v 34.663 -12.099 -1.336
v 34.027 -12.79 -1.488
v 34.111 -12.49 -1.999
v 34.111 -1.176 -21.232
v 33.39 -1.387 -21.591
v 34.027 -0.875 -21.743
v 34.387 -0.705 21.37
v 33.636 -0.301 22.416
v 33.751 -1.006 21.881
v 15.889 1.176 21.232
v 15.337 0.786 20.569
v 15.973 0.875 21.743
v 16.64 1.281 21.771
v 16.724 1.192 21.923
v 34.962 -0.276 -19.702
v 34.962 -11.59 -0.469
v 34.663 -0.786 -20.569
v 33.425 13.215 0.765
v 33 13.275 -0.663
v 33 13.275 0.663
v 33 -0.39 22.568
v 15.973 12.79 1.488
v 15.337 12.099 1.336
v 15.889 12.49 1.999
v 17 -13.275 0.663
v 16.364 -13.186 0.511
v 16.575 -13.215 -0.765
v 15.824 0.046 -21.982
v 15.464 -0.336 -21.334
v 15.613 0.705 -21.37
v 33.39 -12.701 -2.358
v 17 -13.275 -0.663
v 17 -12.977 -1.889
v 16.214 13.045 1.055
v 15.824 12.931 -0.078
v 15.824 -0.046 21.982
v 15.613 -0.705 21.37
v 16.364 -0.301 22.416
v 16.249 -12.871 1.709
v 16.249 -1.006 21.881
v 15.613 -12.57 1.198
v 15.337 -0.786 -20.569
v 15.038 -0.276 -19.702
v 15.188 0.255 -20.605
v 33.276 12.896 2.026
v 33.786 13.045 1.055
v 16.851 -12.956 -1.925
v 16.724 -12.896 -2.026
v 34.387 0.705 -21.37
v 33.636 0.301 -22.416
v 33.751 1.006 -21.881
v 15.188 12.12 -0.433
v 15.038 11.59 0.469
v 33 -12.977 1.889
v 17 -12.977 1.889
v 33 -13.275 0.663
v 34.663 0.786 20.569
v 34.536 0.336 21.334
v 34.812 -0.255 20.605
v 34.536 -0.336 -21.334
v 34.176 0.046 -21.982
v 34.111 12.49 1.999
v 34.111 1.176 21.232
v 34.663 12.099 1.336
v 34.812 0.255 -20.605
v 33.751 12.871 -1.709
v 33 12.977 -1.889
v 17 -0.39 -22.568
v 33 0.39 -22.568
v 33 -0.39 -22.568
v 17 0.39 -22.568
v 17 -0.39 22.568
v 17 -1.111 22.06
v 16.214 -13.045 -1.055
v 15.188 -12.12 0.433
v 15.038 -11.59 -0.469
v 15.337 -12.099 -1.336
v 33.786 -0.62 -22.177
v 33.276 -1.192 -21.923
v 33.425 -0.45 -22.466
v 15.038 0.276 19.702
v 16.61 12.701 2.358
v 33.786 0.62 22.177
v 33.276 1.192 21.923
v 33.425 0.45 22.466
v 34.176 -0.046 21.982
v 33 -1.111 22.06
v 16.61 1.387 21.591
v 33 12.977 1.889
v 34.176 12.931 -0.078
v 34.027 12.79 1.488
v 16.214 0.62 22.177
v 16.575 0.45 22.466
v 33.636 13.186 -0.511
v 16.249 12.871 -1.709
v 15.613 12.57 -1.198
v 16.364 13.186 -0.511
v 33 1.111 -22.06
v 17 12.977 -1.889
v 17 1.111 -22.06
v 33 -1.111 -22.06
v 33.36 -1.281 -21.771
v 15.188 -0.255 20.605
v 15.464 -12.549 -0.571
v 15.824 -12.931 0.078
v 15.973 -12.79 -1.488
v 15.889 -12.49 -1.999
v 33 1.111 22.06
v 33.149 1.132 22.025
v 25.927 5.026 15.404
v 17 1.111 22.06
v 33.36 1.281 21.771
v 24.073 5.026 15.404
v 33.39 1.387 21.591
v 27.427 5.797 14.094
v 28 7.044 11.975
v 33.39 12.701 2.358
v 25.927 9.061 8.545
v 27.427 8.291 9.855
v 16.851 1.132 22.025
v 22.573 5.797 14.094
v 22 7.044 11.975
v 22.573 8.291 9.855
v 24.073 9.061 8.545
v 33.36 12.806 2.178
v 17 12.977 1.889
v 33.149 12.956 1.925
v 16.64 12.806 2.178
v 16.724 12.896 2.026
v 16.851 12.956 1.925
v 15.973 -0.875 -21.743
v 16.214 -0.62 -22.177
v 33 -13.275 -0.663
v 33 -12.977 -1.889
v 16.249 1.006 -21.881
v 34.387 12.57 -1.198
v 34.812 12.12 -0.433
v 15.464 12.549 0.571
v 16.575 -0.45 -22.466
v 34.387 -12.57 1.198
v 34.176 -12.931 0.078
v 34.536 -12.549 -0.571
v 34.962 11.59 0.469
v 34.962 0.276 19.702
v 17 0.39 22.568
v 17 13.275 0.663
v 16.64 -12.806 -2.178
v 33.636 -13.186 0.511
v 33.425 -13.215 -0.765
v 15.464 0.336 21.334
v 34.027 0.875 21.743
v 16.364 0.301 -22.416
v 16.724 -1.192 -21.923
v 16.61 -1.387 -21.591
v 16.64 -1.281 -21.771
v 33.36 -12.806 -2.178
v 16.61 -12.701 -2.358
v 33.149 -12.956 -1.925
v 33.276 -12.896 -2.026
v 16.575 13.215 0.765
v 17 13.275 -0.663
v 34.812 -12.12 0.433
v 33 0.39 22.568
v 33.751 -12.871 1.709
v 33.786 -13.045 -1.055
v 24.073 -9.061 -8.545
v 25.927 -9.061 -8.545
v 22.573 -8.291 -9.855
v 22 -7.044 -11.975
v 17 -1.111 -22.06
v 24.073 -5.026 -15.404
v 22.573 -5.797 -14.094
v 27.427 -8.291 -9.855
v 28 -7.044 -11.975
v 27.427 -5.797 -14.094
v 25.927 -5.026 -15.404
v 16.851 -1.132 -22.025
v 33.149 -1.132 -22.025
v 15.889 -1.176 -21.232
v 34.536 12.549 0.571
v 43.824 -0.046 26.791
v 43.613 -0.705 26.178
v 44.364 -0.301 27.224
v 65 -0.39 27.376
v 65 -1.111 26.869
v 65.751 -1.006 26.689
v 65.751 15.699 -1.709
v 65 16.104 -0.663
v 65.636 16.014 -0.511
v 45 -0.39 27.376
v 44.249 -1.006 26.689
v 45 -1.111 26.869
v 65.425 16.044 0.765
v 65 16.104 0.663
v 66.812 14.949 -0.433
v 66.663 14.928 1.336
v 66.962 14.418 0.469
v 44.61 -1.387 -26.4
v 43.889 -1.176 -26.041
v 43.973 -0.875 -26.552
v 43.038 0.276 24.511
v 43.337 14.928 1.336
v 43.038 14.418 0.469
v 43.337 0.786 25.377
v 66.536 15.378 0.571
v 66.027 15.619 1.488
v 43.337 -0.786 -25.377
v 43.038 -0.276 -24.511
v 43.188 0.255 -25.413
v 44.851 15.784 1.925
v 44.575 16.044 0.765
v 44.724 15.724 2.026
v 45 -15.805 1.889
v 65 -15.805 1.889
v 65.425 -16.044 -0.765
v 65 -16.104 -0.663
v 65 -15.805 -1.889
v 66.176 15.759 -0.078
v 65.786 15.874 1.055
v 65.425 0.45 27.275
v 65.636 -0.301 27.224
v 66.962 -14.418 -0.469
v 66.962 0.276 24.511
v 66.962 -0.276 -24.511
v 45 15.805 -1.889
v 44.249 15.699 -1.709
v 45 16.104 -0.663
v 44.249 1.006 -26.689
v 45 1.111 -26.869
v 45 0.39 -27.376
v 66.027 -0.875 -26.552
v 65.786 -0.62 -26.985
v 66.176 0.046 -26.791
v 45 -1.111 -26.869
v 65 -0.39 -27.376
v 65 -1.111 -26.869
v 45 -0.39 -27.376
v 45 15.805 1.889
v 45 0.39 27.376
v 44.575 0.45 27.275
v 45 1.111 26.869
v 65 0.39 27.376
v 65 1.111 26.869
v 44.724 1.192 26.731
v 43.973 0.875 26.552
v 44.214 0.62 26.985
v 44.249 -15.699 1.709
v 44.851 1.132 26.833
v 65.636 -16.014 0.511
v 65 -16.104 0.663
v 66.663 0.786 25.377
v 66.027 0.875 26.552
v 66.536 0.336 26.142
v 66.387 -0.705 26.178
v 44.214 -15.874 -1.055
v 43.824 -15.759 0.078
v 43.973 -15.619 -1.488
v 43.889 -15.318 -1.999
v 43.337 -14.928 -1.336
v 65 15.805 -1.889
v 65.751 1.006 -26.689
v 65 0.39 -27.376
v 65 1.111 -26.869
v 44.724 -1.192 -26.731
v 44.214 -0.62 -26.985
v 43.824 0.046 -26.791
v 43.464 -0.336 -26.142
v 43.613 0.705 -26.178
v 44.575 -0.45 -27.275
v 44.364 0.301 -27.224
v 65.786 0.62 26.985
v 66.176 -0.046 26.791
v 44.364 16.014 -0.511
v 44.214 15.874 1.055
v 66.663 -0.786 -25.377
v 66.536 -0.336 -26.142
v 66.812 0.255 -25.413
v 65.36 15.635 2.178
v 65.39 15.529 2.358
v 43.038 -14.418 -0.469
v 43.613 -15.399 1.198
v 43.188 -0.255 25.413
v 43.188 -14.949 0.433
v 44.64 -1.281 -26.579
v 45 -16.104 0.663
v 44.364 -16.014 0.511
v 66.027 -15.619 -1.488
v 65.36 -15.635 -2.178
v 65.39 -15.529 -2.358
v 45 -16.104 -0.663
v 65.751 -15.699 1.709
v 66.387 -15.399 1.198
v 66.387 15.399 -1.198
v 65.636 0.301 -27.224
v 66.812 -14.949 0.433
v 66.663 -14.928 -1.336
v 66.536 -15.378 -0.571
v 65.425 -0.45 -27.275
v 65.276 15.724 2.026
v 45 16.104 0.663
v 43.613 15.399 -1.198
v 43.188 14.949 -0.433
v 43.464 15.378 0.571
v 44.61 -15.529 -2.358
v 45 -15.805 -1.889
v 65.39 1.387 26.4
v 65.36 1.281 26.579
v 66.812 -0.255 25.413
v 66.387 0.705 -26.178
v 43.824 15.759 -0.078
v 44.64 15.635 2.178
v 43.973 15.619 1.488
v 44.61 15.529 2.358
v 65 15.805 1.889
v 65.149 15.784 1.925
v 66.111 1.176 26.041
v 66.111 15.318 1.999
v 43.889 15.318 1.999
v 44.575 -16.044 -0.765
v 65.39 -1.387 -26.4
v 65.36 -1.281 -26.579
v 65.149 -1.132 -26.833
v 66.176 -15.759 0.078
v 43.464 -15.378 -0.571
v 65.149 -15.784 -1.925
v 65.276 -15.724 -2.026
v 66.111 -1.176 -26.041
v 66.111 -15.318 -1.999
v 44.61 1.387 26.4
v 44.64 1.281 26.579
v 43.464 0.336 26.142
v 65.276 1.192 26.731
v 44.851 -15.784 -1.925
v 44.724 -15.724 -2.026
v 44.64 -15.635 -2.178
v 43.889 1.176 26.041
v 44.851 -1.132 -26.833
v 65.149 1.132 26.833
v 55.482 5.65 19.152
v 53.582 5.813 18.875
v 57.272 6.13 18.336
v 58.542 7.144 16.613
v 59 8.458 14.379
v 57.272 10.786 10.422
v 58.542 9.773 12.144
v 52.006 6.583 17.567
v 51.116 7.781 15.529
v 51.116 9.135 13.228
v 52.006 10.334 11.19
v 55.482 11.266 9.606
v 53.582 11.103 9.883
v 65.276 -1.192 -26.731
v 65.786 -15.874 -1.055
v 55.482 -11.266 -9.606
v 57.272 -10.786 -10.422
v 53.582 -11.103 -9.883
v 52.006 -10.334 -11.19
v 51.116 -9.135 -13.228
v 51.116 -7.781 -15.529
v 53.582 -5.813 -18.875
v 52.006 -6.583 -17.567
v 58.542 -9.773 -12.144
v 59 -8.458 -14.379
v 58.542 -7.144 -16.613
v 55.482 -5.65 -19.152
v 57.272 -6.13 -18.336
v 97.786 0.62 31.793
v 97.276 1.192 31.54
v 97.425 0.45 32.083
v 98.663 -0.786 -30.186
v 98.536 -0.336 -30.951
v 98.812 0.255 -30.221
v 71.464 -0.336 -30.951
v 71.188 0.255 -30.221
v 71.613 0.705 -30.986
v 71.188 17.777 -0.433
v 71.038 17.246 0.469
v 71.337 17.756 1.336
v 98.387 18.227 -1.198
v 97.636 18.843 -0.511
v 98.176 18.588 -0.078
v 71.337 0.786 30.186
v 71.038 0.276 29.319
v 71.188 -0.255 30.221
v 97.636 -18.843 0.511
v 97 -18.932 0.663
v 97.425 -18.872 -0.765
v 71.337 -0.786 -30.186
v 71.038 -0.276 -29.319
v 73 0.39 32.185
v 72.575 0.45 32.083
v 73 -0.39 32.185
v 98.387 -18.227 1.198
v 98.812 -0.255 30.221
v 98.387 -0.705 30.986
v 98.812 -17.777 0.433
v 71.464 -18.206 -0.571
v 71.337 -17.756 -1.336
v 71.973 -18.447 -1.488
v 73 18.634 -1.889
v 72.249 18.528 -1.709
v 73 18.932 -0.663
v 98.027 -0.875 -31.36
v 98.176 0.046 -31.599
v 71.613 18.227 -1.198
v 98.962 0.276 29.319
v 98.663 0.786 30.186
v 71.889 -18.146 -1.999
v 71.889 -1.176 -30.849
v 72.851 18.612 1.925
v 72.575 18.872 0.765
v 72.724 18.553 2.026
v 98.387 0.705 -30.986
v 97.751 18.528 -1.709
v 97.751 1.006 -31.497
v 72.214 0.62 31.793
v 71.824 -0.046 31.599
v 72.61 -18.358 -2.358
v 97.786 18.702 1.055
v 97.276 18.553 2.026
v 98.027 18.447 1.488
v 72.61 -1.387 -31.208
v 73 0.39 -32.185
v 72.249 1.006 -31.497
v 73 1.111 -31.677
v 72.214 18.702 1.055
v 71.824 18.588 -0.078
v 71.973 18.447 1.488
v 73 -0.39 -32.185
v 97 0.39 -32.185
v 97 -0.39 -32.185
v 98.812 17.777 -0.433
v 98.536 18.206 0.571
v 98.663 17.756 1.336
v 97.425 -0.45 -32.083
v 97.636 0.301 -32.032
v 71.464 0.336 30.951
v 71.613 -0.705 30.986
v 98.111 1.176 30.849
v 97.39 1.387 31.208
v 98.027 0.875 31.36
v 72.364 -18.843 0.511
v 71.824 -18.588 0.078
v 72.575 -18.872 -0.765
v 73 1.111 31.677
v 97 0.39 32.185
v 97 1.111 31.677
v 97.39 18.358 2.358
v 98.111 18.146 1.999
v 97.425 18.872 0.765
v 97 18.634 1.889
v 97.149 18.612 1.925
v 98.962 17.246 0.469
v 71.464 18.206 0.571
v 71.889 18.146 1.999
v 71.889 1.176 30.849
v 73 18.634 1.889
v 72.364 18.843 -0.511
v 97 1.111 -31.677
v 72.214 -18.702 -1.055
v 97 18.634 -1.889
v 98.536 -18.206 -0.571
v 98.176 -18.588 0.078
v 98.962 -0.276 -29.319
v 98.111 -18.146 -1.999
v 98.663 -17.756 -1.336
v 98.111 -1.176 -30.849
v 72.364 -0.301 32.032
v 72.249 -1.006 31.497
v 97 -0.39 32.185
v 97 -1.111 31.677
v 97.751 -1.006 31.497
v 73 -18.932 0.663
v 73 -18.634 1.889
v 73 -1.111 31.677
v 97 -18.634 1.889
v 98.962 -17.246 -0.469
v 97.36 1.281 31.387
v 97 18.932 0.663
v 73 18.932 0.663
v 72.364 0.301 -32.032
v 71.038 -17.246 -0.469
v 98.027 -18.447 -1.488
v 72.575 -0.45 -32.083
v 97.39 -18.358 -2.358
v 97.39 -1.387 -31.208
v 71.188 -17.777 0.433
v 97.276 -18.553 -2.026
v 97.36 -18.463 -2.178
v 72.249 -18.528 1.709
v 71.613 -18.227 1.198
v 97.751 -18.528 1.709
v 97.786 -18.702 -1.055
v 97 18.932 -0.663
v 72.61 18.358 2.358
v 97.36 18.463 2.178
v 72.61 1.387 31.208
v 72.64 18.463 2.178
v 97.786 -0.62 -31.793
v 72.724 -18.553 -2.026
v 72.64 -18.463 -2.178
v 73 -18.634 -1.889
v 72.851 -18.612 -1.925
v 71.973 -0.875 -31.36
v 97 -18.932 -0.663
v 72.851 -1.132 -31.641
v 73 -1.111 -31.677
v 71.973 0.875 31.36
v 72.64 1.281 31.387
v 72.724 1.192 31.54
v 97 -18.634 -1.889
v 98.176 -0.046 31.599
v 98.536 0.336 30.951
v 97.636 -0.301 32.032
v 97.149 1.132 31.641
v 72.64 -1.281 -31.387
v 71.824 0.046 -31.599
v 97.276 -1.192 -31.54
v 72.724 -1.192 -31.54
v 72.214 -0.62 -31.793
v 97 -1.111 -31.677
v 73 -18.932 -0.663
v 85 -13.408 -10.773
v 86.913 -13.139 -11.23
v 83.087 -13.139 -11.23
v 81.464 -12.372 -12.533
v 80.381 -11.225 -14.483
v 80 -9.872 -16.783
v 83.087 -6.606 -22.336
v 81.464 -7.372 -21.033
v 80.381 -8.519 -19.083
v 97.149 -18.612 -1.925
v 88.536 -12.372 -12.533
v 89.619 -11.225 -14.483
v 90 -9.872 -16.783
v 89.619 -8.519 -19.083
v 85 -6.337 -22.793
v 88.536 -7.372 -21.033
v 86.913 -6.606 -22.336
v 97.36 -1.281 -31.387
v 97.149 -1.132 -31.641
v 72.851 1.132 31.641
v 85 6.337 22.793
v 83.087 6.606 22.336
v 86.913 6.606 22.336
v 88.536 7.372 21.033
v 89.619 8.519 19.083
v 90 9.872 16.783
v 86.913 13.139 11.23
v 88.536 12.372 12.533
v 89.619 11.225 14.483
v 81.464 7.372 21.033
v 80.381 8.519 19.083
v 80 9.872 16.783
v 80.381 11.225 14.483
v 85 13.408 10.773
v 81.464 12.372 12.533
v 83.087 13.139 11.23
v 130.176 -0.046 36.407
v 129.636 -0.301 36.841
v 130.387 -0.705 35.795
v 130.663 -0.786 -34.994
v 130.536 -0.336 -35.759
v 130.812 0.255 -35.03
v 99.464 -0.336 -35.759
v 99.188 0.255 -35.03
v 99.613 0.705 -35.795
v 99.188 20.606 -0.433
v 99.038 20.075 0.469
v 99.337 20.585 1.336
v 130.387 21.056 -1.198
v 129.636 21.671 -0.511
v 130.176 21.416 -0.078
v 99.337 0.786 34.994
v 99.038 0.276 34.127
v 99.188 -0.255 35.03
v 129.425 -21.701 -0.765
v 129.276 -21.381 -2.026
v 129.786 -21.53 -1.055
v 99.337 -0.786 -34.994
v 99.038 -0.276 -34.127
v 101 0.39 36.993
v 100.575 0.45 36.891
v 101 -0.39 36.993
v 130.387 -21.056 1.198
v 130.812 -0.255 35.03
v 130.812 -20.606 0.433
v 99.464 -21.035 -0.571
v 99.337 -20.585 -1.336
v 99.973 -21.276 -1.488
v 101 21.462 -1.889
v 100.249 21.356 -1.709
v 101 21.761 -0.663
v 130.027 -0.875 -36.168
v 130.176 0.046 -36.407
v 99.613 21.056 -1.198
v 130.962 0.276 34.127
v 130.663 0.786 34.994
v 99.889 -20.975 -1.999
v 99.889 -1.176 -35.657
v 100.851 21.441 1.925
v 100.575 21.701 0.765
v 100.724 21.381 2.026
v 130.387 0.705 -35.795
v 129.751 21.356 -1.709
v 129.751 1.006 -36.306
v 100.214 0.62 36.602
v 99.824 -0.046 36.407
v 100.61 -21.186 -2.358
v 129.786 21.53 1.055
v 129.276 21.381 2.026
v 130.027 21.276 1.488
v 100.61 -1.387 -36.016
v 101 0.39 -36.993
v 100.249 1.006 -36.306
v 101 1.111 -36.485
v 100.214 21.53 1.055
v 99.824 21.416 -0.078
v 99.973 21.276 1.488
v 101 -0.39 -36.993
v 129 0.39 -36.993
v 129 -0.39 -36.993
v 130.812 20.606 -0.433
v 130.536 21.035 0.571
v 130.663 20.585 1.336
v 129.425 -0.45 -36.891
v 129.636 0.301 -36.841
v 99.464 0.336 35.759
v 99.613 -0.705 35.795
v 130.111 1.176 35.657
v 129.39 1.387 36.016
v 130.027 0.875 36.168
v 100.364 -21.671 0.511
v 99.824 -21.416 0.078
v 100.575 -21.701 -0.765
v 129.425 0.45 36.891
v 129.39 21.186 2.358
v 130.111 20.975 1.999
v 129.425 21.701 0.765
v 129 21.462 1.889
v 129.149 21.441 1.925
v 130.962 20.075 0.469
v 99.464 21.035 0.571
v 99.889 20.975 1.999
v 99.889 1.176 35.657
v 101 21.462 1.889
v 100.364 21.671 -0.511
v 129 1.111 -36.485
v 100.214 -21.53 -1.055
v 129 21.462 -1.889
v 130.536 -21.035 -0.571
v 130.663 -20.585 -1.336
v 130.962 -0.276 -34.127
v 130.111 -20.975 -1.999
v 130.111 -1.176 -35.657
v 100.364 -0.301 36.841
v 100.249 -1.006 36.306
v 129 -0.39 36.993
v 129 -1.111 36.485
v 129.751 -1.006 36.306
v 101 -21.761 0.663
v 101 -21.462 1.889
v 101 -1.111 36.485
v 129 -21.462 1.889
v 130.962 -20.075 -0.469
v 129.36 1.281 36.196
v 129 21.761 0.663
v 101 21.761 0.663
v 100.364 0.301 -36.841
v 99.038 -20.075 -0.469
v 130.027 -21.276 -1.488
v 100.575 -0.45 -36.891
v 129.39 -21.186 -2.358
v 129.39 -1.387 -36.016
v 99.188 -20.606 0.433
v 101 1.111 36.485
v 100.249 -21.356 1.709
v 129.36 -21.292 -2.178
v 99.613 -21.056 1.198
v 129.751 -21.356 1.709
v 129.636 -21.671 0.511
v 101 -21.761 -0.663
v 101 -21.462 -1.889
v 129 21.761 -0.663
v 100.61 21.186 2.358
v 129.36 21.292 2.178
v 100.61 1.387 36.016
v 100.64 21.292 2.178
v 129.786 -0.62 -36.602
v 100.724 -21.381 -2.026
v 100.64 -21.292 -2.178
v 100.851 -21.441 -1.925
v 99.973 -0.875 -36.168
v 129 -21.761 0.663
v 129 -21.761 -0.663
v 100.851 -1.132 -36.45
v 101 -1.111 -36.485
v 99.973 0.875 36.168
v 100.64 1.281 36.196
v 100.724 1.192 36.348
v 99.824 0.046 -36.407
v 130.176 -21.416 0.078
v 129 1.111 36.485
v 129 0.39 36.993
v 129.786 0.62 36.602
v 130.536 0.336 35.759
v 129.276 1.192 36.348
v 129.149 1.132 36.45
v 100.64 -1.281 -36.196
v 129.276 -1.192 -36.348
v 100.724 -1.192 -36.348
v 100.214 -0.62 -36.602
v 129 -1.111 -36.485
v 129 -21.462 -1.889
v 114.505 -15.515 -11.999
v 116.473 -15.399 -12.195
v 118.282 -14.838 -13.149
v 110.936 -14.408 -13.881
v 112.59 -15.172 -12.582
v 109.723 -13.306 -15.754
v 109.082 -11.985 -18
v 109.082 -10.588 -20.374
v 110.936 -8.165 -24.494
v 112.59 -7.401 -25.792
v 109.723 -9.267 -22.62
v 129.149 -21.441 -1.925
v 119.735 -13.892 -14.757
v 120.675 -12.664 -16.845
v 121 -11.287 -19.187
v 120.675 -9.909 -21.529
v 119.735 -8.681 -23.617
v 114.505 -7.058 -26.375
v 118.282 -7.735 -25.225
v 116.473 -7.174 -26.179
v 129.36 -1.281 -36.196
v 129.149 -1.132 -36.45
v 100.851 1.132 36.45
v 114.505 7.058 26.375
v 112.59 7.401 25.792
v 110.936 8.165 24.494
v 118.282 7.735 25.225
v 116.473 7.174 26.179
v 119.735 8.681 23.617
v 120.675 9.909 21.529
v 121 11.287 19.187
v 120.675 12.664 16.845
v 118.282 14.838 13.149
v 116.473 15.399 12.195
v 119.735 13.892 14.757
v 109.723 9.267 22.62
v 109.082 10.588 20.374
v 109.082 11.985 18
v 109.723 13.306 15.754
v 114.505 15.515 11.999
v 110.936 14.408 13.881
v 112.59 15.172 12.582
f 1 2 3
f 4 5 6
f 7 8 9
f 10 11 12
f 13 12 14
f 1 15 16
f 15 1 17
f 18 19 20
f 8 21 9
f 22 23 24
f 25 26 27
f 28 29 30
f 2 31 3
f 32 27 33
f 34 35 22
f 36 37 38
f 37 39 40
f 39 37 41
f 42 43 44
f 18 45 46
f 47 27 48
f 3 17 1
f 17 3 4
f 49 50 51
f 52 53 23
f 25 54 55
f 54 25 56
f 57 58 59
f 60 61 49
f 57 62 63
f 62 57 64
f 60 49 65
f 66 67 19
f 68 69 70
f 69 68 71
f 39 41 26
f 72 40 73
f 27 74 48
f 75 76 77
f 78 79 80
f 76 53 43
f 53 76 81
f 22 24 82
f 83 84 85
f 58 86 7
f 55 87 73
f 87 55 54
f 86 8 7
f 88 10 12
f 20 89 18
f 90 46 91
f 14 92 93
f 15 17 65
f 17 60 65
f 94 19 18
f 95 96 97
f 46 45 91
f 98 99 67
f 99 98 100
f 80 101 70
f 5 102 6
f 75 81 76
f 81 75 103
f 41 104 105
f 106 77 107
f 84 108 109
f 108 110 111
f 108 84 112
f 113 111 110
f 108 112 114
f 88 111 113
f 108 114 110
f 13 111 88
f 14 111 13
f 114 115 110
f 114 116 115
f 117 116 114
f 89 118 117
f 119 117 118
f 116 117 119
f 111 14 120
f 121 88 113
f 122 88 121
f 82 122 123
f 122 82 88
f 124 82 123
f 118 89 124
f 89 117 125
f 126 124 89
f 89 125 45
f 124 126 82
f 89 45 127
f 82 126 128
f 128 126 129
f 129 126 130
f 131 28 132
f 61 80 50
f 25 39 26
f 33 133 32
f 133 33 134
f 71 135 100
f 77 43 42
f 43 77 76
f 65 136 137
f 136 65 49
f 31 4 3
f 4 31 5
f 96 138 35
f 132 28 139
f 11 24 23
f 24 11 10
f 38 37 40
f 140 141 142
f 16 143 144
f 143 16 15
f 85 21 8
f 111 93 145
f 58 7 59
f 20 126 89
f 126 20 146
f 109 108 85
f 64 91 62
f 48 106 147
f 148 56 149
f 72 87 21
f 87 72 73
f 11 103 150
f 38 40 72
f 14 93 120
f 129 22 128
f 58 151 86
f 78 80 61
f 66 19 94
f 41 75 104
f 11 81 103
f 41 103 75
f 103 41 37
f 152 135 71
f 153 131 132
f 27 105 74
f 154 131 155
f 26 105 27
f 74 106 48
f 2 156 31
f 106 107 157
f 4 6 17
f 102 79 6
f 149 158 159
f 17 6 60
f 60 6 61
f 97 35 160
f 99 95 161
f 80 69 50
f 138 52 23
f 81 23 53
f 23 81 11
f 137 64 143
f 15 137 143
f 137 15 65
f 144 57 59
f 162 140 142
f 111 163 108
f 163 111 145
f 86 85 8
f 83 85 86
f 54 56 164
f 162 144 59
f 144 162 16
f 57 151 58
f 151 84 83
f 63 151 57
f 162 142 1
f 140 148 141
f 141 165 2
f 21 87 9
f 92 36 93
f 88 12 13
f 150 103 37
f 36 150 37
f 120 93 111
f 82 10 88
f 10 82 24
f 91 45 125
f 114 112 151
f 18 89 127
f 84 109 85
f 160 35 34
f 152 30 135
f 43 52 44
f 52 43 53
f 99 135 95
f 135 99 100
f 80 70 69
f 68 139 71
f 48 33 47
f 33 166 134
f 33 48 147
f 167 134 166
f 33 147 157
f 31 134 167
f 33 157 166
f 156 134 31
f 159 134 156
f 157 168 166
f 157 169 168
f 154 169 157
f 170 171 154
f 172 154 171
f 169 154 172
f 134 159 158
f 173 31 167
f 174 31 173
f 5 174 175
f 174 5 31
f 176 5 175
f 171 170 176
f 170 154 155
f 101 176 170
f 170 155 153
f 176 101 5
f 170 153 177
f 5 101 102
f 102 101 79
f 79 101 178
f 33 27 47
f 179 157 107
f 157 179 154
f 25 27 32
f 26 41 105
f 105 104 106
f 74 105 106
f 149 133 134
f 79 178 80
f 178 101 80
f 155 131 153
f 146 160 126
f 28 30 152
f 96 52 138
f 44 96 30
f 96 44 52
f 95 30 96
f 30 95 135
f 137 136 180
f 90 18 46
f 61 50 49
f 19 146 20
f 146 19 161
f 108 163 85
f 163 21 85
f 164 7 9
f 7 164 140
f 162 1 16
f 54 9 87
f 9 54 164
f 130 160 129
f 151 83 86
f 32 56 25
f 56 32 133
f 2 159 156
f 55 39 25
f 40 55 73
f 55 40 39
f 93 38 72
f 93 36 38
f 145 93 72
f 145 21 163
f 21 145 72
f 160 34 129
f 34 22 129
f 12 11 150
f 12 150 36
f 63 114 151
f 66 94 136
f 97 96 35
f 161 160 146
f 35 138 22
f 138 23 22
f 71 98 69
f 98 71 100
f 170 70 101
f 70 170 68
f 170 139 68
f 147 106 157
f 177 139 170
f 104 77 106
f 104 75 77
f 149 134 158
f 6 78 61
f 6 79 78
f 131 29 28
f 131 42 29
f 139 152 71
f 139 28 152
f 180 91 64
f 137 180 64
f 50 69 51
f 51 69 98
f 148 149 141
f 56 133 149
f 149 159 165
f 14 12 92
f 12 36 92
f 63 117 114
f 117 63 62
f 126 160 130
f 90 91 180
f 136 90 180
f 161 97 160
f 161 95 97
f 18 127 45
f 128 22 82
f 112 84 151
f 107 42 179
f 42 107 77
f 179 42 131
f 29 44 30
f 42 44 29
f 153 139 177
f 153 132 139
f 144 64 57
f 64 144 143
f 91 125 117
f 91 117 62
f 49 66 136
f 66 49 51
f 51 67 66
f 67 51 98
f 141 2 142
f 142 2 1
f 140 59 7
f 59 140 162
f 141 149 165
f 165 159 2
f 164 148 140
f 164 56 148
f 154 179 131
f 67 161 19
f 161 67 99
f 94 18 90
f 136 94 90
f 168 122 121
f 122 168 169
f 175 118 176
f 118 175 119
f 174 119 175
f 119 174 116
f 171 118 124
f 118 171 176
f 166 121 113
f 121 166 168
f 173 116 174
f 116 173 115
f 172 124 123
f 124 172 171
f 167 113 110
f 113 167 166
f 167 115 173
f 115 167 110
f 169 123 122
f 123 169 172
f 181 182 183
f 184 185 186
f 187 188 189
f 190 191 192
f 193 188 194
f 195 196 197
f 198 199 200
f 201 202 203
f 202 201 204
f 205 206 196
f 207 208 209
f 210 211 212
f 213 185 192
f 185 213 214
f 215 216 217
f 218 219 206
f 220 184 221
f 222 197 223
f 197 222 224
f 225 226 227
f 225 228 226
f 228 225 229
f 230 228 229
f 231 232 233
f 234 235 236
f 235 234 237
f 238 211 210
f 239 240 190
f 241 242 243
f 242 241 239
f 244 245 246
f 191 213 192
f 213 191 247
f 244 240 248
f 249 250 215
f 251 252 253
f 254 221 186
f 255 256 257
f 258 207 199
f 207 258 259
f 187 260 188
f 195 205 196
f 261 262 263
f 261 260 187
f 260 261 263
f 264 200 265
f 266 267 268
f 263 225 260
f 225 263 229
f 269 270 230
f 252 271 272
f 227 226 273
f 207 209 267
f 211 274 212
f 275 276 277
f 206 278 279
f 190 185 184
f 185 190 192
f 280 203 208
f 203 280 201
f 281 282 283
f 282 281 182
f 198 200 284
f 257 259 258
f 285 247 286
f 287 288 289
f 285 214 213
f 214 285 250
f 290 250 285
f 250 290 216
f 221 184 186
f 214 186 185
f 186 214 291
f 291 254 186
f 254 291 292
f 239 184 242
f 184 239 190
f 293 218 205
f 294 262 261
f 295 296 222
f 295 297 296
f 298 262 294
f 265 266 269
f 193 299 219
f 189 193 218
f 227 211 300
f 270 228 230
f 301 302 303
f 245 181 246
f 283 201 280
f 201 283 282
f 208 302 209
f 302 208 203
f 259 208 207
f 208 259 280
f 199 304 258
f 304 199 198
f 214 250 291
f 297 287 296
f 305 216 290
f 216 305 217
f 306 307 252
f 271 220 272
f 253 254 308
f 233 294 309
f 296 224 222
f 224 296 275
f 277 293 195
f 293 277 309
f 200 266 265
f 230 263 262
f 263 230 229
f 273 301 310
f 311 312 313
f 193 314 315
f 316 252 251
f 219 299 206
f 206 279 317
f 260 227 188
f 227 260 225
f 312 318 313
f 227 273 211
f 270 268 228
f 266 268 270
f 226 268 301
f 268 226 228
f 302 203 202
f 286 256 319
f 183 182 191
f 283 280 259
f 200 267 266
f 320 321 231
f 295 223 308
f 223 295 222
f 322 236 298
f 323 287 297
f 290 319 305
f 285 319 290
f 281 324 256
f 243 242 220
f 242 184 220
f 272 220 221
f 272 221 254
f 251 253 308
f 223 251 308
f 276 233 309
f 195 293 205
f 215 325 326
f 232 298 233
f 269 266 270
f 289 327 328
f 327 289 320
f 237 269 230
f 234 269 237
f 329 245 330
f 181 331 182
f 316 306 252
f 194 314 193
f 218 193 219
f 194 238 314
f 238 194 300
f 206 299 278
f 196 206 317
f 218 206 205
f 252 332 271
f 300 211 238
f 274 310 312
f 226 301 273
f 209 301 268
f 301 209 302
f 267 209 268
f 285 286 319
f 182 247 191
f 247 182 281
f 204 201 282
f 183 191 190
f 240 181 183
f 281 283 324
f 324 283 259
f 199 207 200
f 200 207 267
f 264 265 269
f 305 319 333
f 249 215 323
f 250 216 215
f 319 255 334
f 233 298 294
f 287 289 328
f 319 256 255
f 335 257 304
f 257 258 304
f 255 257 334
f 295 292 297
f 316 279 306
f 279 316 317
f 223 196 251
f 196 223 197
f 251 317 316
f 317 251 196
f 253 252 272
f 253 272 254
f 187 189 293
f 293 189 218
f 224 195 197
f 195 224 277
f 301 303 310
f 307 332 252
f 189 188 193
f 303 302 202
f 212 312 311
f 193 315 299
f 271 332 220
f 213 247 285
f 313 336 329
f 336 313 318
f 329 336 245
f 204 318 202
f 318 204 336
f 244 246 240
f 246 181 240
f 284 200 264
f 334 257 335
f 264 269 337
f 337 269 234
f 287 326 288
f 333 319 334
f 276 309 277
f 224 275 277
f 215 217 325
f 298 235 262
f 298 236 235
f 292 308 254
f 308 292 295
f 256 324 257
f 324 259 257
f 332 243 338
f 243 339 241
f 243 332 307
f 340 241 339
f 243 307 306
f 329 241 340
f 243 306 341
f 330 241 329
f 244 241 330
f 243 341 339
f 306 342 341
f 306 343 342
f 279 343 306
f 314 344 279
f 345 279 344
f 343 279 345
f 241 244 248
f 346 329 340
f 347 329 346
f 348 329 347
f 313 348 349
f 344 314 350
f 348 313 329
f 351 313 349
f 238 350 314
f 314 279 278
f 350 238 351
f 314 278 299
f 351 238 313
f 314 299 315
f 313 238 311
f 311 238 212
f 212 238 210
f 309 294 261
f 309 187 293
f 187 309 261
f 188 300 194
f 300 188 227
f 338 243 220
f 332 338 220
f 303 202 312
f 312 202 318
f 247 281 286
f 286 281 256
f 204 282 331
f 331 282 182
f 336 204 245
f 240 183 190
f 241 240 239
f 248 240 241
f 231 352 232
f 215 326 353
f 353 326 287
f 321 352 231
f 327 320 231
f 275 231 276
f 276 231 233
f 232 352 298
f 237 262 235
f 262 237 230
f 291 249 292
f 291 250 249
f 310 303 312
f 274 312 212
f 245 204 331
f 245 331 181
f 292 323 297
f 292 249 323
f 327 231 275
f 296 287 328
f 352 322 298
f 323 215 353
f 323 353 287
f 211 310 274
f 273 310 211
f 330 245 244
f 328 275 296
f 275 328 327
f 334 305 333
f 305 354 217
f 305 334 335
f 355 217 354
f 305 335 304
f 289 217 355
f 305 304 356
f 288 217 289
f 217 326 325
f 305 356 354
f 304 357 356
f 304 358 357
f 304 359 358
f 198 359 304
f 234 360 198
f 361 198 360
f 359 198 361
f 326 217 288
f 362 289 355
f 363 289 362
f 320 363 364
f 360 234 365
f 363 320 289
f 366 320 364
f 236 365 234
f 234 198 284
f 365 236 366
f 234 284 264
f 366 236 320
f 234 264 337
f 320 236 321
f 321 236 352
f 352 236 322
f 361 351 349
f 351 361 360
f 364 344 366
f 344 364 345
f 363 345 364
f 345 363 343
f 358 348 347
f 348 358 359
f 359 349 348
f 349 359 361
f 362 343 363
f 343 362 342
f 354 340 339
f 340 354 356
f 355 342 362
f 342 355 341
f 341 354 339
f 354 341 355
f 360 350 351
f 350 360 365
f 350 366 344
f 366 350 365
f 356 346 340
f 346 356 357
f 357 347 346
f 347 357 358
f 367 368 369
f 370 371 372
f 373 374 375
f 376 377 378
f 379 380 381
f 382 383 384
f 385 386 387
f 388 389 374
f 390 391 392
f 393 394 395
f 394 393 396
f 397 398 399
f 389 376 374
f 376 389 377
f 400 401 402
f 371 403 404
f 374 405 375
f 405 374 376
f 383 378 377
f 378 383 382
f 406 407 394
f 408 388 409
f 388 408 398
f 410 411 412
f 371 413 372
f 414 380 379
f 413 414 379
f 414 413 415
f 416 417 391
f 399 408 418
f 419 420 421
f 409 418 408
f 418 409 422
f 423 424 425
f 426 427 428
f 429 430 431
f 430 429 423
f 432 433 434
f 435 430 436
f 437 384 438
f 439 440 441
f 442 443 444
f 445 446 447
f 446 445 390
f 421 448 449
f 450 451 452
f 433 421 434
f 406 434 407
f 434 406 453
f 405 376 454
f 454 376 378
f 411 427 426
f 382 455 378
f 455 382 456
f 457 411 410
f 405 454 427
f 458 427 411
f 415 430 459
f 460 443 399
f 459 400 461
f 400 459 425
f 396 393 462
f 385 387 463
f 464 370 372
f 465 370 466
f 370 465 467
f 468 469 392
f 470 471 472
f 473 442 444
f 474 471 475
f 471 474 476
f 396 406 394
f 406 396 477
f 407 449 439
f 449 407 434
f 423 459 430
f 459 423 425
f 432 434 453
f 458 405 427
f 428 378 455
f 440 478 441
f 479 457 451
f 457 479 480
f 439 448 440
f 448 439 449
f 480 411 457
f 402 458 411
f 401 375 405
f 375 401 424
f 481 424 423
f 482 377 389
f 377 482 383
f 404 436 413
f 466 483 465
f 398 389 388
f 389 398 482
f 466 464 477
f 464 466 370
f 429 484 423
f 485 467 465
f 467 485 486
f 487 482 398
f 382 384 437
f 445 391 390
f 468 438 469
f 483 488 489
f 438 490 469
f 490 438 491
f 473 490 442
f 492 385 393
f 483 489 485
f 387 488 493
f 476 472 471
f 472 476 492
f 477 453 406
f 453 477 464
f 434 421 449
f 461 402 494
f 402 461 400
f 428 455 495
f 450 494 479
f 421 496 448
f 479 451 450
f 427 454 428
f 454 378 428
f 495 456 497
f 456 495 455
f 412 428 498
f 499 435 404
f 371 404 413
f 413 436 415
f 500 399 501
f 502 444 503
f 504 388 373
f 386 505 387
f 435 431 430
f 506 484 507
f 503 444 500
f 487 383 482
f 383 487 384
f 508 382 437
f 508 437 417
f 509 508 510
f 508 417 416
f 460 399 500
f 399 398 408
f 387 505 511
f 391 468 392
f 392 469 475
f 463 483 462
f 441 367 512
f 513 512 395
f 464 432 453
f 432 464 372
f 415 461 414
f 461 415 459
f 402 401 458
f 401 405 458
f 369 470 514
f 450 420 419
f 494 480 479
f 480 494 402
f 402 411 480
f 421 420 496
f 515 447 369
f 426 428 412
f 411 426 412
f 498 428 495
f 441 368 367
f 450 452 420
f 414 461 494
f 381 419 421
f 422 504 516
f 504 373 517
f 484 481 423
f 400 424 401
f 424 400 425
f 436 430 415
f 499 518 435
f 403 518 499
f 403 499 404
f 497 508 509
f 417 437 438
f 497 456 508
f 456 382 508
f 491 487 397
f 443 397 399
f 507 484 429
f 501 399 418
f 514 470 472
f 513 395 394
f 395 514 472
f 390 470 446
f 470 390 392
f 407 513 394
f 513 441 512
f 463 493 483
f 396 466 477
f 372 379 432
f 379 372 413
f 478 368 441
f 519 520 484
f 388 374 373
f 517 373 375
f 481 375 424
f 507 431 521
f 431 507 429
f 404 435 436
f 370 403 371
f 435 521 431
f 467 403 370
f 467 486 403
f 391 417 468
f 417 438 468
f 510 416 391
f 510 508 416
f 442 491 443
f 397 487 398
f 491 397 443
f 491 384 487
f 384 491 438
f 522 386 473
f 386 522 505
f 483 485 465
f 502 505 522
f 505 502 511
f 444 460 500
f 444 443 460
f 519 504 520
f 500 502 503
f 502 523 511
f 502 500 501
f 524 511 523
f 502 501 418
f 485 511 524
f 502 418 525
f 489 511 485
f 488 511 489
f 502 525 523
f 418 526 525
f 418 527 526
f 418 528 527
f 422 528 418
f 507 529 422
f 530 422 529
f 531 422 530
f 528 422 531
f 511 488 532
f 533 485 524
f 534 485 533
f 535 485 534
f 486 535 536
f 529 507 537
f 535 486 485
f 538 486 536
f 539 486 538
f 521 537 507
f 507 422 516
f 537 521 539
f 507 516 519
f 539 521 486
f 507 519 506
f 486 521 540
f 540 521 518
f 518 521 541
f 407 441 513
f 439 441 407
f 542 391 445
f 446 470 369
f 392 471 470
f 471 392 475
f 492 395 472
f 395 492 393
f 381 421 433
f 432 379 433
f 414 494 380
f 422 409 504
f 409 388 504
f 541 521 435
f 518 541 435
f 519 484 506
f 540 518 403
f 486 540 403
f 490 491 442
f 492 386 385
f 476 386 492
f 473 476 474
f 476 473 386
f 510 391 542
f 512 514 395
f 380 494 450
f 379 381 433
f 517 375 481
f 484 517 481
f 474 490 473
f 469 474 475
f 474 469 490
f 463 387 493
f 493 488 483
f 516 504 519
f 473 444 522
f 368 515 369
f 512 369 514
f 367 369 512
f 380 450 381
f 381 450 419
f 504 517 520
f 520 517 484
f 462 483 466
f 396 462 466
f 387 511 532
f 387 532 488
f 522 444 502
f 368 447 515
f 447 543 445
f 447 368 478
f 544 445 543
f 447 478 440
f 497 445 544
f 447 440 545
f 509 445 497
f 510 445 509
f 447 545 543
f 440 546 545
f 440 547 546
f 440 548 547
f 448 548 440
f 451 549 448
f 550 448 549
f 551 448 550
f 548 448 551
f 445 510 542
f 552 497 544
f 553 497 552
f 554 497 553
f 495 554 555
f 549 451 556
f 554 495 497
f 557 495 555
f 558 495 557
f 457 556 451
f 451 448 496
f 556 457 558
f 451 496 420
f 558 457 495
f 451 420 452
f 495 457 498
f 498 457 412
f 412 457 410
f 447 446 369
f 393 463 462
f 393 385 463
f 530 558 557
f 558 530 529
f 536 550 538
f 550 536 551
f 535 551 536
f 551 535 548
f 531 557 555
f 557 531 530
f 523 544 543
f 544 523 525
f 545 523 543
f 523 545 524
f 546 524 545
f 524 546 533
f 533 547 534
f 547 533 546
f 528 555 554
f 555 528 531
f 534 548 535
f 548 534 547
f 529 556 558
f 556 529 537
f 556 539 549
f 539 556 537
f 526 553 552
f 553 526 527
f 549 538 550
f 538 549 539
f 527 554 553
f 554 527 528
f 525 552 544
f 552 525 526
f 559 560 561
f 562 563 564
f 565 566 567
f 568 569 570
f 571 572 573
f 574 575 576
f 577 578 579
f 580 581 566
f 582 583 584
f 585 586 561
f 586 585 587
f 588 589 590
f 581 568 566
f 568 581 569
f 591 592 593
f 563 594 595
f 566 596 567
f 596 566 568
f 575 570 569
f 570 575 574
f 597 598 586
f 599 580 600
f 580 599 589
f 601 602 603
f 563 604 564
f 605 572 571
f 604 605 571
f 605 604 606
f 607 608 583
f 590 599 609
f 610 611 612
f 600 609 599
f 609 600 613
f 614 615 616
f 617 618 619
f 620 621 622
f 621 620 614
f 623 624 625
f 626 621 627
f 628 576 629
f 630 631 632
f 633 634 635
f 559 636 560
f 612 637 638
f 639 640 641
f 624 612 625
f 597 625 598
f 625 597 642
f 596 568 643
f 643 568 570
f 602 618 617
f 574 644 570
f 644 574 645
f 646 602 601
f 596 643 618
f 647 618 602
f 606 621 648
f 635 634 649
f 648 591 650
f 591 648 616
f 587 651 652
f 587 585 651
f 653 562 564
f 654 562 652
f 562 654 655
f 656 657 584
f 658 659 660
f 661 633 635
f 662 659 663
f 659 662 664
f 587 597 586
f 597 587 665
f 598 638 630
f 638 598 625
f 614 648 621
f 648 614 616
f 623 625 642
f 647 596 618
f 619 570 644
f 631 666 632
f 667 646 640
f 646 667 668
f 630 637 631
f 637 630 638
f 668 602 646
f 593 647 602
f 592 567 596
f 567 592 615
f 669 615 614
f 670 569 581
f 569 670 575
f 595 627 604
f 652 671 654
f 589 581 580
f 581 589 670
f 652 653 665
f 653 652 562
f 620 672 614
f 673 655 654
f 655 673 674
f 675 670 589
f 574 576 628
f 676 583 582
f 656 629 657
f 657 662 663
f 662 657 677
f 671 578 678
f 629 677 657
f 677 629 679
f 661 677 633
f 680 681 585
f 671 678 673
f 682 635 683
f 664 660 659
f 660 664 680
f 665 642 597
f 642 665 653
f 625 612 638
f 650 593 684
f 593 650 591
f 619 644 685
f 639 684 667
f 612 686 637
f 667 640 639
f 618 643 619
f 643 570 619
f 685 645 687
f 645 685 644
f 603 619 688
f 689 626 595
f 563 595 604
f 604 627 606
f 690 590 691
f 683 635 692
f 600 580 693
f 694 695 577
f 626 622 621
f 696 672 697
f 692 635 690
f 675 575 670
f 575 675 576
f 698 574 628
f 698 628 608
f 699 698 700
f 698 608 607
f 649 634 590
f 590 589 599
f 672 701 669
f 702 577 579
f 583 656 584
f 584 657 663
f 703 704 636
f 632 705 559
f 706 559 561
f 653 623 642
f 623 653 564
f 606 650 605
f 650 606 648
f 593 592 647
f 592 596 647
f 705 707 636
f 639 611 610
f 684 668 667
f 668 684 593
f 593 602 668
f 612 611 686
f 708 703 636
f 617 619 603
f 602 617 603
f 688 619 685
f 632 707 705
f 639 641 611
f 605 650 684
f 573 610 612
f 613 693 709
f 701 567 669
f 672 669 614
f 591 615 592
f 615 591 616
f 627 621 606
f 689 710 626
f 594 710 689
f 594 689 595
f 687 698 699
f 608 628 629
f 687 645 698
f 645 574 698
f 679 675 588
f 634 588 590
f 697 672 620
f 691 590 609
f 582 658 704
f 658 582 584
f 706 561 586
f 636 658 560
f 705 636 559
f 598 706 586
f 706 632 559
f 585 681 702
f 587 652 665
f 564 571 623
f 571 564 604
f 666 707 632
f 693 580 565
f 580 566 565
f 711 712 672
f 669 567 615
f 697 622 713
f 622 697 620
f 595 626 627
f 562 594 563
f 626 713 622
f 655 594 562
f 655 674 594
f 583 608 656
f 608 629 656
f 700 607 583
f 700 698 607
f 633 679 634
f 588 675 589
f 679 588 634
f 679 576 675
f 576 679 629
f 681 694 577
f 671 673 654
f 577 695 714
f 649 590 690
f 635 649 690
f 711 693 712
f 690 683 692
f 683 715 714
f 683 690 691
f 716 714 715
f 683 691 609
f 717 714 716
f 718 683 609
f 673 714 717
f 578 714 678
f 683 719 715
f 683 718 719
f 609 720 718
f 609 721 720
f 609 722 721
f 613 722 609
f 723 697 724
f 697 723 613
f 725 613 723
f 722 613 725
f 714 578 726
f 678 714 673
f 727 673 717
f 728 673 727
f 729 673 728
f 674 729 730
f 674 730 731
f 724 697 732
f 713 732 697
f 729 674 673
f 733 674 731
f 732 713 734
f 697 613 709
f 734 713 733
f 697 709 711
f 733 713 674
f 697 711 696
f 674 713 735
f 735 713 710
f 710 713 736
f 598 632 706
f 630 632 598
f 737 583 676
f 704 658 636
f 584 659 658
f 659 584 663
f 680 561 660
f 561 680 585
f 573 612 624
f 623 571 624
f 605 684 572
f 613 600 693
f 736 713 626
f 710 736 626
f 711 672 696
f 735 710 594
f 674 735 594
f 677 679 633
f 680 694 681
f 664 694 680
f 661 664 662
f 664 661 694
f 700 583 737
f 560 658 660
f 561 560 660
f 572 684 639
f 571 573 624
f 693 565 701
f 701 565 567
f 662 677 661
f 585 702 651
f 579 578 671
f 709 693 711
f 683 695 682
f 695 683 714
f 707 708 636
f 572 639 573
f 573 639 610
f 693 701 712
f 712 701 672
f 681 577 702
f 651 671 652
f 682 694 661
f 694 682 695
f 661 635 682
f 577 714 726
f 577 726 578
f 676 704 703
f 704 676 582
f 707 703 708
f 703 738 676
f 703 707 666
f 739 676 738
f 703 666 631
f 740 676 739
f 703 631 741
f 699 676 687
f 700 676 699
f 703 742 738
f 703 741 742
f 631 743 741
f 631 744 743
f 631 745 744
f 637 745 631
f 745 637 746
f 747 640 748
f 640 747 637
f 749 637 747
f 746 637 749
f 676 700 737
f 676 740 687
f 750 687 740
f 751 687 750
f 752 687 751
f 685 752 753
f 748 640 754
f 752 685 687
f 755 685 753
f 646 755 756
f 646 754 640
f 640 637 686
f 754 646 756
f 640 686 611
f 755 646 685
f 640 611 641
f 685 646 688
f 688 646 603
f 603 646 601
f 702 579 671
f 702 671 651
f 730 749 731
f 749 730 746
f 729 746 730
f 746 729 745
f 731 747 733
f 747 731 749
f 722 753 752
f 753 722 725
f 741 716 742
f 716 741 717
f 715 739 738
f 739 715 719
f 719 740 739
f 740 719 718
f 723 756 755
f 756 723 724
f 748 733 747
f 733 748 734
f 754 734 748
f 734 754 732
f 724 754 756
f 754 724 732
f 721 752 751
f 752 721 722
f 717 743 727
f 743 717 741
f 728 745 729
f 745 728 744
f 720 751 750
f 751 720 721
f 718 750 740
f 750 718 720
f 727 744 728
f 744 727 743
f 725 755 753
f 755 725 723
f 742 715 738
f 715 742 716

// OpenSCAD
module bored_block(size=20, bore=12, rounded=true) {
    translate([115, 0, 0]) scale([1, 1, 1.7]) translate([-115, 0, 0]) translate([85, 0, 0]) rotate([-45, 0, 0]) translate([-75, 0, 0]) difference() {
        if (rounded)
            minkowski() { cube(size - 4, center=true); sphere(2, $fn=16); }
        else
            cube(size, center=true);
        cylinder(h=size*2, d=bore, center=true);
    }
}

for (i = [0:3])
    translate([i * 30 + 15, 0, 0])
        bored_block(size = 20 + i*4, bore = 6 + i*2);
